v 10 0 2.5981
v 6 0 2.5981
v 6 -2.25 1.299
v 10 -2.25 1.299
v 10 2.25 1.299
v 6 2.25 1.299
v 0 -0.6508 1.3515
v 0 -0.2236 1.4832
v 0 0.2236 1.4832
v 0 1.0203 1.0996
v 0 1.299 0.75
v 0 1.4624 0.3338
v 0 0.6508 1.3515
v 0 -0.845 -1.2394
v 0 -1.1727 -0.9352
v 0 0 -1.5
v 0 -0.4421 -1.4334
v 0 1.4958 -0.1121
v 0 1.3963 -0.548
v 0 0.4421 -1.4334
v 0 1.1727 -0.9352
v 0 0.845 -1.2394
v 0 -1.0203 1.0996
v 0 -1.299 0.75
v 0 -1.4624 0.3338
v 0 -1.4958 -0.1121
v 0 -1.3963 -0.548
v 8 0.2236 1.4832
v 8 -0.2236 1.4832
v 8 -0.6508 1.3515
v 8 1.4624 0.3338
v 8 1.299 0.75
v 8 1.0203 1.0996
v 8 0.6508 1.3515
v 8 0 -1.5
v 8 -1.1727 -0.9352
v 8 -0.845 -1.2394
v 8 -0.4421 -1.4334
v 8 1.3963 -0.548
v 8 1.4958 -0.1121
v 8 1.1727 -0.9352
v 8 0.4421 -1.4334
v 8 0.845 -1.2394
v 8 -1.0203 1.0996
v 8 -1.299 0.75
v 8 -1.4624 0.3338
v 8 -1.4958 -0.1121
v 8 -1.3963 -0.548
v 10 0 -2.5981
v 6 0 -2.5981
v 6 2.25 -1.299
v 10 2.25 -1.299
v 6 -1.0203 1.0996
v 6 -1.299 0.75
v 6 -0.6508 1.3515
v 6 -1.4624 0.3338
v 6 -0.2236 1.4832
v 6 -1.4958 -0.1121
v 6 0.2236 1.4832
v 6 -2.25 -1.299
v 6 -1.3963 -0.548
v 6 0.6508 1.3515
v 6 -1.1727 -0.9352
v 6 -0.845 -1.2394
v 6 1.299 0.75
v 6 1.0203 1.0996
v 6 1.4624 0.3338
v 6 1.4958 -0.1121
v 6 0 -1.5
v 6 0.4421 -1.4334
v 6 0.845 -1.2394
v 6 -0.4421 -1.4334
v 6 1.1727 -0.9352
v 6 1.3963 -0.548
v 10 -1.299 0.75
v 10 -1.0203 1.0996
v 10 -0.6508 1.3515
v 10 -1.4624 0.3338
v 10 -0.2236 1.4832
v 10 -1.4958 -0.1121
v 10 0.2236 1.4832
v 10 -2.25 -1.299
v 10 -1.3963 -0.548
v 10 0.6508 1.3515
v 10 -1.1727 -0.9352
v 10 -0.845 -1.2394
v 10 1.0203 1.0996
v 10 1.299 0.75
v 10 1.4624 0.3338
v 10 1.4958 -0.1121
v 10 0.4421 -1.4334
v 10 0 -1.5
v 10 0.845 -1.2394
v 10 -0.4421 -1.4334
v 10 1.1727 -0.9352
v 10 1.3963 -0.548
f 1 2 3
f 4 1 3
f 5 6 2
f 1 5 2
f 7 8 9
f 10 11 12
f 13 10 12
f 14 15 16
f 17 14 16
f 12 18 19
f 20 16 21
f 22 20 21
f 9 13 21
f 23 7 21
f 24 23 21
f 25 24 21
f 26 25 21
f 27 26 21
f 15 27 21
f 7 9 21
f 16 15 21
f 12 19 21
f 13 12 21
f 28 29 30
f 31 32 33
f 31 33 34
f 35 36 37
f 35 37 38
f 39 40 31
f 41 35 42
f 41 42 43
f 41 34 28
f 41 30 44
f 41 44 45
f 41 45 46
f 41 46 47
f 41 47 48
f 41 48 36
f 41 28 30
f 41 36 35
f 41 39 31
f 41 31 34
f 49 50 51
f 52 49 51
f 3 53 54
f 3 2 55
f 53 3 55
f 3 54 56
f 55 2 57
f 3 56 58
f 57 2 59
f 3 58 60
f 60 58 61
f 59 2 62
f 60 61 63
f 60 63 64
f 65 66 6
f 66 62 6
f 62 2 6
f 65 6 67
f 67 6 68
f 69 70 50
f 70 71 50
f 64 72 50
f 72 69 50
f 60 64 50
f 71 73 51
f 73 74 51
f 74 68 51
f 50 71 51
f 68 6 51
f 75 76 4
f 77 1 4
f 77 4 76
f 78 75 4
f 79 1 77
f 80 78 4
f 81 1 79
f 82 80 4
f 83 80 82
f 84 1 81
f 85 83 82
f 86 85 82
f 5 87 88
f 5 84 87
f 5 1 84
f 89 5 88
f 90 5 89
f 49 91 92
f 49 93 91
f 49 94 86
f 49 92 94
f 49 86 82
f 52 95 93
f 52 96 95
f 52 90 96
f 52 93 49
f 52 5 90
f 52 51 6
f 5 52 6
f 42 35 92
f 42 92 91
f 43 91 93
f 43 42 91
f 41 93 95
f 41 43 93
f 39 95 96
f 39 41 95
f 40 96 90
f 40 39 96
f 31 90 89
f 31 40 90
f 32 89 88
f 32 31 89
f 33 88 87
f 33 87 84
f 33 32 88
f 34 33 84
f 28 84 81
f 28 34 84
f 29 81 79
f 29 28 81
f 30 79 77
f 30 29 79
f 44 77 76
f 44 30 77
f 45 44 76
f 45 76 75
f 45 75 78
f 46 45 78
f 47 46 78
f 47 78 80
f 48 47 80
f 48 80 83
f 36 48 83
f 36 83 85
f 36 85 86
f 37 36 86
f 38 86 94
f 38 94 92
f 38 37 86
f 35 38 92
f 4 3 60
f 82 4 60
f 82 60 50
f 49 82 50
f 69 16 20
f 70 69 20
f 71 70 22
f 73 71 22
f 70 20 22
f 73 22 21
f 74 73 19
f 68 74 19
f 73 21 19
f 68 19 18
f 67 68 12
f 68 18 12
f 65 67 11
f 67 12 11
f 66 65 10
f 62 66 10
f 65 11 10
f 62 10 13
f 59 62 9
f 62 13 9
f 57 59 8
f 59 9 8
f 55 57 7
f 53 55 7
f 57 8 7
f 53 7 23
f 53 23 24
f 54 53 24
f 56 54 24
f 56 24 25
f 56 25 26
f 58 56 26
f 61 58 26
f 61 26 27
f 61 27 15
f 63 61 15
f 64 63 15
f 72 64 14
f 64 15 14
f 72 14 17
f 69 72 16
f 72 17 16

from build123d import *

# Parameters (mm, degrees)
SKETCH_1_R          = 1.5
EXTRUDE_1_DEPTH     = 6
EXTRUDE_2_DEPTH     = 4
CUT_EXTRUDE_START   = -2
SKETCH_4_R          = 1.5
CUT_EXTRUDE_1_DEPTH = 2


with BuildPart() as part:
    # 草图1 → 凸台-拉伸1 (new body)
    with BuildSketch(Plane(origin=(0, 0, 0), x_dir=(0, 0, -1), z_dir=(1, 0, 0))):
        Circle(SKETCH_1_R)
    extrude(amount=EXTRUDE_1_DEPTH)

    # 草图2 → 凸台-拉伸2 (add)
    with BuildSketch(Plane(origin=(6, 0, 0), x_dir=(0, 0, -1), z_dir=(1, 0, 0))):
        Polygon((2.598076211, 0), (1.299038106, 2.25), (-1.299038106, 2.25), (-2.598076211, 0), (-1.299038106, -2.25), (1.299038106, -2.25), align=None)
    extrude(amount=EXTRUDE_2_DEPTH)

    # 草图4 → 切除-拉伸1 (cut)
    with BuildSketch(Plane(origin=(10, 0, 0), x_dir=(0, 0, -1), z_dir=(1, 0, 0)).offset(CUT_EXTRUDE_START)):
        Circle(SKETCH_4_R)
    extrude(amount=CUT_EXTRUDE_1_DEPTH, mode=Mode.SUBTRACT)


solid = part.part
